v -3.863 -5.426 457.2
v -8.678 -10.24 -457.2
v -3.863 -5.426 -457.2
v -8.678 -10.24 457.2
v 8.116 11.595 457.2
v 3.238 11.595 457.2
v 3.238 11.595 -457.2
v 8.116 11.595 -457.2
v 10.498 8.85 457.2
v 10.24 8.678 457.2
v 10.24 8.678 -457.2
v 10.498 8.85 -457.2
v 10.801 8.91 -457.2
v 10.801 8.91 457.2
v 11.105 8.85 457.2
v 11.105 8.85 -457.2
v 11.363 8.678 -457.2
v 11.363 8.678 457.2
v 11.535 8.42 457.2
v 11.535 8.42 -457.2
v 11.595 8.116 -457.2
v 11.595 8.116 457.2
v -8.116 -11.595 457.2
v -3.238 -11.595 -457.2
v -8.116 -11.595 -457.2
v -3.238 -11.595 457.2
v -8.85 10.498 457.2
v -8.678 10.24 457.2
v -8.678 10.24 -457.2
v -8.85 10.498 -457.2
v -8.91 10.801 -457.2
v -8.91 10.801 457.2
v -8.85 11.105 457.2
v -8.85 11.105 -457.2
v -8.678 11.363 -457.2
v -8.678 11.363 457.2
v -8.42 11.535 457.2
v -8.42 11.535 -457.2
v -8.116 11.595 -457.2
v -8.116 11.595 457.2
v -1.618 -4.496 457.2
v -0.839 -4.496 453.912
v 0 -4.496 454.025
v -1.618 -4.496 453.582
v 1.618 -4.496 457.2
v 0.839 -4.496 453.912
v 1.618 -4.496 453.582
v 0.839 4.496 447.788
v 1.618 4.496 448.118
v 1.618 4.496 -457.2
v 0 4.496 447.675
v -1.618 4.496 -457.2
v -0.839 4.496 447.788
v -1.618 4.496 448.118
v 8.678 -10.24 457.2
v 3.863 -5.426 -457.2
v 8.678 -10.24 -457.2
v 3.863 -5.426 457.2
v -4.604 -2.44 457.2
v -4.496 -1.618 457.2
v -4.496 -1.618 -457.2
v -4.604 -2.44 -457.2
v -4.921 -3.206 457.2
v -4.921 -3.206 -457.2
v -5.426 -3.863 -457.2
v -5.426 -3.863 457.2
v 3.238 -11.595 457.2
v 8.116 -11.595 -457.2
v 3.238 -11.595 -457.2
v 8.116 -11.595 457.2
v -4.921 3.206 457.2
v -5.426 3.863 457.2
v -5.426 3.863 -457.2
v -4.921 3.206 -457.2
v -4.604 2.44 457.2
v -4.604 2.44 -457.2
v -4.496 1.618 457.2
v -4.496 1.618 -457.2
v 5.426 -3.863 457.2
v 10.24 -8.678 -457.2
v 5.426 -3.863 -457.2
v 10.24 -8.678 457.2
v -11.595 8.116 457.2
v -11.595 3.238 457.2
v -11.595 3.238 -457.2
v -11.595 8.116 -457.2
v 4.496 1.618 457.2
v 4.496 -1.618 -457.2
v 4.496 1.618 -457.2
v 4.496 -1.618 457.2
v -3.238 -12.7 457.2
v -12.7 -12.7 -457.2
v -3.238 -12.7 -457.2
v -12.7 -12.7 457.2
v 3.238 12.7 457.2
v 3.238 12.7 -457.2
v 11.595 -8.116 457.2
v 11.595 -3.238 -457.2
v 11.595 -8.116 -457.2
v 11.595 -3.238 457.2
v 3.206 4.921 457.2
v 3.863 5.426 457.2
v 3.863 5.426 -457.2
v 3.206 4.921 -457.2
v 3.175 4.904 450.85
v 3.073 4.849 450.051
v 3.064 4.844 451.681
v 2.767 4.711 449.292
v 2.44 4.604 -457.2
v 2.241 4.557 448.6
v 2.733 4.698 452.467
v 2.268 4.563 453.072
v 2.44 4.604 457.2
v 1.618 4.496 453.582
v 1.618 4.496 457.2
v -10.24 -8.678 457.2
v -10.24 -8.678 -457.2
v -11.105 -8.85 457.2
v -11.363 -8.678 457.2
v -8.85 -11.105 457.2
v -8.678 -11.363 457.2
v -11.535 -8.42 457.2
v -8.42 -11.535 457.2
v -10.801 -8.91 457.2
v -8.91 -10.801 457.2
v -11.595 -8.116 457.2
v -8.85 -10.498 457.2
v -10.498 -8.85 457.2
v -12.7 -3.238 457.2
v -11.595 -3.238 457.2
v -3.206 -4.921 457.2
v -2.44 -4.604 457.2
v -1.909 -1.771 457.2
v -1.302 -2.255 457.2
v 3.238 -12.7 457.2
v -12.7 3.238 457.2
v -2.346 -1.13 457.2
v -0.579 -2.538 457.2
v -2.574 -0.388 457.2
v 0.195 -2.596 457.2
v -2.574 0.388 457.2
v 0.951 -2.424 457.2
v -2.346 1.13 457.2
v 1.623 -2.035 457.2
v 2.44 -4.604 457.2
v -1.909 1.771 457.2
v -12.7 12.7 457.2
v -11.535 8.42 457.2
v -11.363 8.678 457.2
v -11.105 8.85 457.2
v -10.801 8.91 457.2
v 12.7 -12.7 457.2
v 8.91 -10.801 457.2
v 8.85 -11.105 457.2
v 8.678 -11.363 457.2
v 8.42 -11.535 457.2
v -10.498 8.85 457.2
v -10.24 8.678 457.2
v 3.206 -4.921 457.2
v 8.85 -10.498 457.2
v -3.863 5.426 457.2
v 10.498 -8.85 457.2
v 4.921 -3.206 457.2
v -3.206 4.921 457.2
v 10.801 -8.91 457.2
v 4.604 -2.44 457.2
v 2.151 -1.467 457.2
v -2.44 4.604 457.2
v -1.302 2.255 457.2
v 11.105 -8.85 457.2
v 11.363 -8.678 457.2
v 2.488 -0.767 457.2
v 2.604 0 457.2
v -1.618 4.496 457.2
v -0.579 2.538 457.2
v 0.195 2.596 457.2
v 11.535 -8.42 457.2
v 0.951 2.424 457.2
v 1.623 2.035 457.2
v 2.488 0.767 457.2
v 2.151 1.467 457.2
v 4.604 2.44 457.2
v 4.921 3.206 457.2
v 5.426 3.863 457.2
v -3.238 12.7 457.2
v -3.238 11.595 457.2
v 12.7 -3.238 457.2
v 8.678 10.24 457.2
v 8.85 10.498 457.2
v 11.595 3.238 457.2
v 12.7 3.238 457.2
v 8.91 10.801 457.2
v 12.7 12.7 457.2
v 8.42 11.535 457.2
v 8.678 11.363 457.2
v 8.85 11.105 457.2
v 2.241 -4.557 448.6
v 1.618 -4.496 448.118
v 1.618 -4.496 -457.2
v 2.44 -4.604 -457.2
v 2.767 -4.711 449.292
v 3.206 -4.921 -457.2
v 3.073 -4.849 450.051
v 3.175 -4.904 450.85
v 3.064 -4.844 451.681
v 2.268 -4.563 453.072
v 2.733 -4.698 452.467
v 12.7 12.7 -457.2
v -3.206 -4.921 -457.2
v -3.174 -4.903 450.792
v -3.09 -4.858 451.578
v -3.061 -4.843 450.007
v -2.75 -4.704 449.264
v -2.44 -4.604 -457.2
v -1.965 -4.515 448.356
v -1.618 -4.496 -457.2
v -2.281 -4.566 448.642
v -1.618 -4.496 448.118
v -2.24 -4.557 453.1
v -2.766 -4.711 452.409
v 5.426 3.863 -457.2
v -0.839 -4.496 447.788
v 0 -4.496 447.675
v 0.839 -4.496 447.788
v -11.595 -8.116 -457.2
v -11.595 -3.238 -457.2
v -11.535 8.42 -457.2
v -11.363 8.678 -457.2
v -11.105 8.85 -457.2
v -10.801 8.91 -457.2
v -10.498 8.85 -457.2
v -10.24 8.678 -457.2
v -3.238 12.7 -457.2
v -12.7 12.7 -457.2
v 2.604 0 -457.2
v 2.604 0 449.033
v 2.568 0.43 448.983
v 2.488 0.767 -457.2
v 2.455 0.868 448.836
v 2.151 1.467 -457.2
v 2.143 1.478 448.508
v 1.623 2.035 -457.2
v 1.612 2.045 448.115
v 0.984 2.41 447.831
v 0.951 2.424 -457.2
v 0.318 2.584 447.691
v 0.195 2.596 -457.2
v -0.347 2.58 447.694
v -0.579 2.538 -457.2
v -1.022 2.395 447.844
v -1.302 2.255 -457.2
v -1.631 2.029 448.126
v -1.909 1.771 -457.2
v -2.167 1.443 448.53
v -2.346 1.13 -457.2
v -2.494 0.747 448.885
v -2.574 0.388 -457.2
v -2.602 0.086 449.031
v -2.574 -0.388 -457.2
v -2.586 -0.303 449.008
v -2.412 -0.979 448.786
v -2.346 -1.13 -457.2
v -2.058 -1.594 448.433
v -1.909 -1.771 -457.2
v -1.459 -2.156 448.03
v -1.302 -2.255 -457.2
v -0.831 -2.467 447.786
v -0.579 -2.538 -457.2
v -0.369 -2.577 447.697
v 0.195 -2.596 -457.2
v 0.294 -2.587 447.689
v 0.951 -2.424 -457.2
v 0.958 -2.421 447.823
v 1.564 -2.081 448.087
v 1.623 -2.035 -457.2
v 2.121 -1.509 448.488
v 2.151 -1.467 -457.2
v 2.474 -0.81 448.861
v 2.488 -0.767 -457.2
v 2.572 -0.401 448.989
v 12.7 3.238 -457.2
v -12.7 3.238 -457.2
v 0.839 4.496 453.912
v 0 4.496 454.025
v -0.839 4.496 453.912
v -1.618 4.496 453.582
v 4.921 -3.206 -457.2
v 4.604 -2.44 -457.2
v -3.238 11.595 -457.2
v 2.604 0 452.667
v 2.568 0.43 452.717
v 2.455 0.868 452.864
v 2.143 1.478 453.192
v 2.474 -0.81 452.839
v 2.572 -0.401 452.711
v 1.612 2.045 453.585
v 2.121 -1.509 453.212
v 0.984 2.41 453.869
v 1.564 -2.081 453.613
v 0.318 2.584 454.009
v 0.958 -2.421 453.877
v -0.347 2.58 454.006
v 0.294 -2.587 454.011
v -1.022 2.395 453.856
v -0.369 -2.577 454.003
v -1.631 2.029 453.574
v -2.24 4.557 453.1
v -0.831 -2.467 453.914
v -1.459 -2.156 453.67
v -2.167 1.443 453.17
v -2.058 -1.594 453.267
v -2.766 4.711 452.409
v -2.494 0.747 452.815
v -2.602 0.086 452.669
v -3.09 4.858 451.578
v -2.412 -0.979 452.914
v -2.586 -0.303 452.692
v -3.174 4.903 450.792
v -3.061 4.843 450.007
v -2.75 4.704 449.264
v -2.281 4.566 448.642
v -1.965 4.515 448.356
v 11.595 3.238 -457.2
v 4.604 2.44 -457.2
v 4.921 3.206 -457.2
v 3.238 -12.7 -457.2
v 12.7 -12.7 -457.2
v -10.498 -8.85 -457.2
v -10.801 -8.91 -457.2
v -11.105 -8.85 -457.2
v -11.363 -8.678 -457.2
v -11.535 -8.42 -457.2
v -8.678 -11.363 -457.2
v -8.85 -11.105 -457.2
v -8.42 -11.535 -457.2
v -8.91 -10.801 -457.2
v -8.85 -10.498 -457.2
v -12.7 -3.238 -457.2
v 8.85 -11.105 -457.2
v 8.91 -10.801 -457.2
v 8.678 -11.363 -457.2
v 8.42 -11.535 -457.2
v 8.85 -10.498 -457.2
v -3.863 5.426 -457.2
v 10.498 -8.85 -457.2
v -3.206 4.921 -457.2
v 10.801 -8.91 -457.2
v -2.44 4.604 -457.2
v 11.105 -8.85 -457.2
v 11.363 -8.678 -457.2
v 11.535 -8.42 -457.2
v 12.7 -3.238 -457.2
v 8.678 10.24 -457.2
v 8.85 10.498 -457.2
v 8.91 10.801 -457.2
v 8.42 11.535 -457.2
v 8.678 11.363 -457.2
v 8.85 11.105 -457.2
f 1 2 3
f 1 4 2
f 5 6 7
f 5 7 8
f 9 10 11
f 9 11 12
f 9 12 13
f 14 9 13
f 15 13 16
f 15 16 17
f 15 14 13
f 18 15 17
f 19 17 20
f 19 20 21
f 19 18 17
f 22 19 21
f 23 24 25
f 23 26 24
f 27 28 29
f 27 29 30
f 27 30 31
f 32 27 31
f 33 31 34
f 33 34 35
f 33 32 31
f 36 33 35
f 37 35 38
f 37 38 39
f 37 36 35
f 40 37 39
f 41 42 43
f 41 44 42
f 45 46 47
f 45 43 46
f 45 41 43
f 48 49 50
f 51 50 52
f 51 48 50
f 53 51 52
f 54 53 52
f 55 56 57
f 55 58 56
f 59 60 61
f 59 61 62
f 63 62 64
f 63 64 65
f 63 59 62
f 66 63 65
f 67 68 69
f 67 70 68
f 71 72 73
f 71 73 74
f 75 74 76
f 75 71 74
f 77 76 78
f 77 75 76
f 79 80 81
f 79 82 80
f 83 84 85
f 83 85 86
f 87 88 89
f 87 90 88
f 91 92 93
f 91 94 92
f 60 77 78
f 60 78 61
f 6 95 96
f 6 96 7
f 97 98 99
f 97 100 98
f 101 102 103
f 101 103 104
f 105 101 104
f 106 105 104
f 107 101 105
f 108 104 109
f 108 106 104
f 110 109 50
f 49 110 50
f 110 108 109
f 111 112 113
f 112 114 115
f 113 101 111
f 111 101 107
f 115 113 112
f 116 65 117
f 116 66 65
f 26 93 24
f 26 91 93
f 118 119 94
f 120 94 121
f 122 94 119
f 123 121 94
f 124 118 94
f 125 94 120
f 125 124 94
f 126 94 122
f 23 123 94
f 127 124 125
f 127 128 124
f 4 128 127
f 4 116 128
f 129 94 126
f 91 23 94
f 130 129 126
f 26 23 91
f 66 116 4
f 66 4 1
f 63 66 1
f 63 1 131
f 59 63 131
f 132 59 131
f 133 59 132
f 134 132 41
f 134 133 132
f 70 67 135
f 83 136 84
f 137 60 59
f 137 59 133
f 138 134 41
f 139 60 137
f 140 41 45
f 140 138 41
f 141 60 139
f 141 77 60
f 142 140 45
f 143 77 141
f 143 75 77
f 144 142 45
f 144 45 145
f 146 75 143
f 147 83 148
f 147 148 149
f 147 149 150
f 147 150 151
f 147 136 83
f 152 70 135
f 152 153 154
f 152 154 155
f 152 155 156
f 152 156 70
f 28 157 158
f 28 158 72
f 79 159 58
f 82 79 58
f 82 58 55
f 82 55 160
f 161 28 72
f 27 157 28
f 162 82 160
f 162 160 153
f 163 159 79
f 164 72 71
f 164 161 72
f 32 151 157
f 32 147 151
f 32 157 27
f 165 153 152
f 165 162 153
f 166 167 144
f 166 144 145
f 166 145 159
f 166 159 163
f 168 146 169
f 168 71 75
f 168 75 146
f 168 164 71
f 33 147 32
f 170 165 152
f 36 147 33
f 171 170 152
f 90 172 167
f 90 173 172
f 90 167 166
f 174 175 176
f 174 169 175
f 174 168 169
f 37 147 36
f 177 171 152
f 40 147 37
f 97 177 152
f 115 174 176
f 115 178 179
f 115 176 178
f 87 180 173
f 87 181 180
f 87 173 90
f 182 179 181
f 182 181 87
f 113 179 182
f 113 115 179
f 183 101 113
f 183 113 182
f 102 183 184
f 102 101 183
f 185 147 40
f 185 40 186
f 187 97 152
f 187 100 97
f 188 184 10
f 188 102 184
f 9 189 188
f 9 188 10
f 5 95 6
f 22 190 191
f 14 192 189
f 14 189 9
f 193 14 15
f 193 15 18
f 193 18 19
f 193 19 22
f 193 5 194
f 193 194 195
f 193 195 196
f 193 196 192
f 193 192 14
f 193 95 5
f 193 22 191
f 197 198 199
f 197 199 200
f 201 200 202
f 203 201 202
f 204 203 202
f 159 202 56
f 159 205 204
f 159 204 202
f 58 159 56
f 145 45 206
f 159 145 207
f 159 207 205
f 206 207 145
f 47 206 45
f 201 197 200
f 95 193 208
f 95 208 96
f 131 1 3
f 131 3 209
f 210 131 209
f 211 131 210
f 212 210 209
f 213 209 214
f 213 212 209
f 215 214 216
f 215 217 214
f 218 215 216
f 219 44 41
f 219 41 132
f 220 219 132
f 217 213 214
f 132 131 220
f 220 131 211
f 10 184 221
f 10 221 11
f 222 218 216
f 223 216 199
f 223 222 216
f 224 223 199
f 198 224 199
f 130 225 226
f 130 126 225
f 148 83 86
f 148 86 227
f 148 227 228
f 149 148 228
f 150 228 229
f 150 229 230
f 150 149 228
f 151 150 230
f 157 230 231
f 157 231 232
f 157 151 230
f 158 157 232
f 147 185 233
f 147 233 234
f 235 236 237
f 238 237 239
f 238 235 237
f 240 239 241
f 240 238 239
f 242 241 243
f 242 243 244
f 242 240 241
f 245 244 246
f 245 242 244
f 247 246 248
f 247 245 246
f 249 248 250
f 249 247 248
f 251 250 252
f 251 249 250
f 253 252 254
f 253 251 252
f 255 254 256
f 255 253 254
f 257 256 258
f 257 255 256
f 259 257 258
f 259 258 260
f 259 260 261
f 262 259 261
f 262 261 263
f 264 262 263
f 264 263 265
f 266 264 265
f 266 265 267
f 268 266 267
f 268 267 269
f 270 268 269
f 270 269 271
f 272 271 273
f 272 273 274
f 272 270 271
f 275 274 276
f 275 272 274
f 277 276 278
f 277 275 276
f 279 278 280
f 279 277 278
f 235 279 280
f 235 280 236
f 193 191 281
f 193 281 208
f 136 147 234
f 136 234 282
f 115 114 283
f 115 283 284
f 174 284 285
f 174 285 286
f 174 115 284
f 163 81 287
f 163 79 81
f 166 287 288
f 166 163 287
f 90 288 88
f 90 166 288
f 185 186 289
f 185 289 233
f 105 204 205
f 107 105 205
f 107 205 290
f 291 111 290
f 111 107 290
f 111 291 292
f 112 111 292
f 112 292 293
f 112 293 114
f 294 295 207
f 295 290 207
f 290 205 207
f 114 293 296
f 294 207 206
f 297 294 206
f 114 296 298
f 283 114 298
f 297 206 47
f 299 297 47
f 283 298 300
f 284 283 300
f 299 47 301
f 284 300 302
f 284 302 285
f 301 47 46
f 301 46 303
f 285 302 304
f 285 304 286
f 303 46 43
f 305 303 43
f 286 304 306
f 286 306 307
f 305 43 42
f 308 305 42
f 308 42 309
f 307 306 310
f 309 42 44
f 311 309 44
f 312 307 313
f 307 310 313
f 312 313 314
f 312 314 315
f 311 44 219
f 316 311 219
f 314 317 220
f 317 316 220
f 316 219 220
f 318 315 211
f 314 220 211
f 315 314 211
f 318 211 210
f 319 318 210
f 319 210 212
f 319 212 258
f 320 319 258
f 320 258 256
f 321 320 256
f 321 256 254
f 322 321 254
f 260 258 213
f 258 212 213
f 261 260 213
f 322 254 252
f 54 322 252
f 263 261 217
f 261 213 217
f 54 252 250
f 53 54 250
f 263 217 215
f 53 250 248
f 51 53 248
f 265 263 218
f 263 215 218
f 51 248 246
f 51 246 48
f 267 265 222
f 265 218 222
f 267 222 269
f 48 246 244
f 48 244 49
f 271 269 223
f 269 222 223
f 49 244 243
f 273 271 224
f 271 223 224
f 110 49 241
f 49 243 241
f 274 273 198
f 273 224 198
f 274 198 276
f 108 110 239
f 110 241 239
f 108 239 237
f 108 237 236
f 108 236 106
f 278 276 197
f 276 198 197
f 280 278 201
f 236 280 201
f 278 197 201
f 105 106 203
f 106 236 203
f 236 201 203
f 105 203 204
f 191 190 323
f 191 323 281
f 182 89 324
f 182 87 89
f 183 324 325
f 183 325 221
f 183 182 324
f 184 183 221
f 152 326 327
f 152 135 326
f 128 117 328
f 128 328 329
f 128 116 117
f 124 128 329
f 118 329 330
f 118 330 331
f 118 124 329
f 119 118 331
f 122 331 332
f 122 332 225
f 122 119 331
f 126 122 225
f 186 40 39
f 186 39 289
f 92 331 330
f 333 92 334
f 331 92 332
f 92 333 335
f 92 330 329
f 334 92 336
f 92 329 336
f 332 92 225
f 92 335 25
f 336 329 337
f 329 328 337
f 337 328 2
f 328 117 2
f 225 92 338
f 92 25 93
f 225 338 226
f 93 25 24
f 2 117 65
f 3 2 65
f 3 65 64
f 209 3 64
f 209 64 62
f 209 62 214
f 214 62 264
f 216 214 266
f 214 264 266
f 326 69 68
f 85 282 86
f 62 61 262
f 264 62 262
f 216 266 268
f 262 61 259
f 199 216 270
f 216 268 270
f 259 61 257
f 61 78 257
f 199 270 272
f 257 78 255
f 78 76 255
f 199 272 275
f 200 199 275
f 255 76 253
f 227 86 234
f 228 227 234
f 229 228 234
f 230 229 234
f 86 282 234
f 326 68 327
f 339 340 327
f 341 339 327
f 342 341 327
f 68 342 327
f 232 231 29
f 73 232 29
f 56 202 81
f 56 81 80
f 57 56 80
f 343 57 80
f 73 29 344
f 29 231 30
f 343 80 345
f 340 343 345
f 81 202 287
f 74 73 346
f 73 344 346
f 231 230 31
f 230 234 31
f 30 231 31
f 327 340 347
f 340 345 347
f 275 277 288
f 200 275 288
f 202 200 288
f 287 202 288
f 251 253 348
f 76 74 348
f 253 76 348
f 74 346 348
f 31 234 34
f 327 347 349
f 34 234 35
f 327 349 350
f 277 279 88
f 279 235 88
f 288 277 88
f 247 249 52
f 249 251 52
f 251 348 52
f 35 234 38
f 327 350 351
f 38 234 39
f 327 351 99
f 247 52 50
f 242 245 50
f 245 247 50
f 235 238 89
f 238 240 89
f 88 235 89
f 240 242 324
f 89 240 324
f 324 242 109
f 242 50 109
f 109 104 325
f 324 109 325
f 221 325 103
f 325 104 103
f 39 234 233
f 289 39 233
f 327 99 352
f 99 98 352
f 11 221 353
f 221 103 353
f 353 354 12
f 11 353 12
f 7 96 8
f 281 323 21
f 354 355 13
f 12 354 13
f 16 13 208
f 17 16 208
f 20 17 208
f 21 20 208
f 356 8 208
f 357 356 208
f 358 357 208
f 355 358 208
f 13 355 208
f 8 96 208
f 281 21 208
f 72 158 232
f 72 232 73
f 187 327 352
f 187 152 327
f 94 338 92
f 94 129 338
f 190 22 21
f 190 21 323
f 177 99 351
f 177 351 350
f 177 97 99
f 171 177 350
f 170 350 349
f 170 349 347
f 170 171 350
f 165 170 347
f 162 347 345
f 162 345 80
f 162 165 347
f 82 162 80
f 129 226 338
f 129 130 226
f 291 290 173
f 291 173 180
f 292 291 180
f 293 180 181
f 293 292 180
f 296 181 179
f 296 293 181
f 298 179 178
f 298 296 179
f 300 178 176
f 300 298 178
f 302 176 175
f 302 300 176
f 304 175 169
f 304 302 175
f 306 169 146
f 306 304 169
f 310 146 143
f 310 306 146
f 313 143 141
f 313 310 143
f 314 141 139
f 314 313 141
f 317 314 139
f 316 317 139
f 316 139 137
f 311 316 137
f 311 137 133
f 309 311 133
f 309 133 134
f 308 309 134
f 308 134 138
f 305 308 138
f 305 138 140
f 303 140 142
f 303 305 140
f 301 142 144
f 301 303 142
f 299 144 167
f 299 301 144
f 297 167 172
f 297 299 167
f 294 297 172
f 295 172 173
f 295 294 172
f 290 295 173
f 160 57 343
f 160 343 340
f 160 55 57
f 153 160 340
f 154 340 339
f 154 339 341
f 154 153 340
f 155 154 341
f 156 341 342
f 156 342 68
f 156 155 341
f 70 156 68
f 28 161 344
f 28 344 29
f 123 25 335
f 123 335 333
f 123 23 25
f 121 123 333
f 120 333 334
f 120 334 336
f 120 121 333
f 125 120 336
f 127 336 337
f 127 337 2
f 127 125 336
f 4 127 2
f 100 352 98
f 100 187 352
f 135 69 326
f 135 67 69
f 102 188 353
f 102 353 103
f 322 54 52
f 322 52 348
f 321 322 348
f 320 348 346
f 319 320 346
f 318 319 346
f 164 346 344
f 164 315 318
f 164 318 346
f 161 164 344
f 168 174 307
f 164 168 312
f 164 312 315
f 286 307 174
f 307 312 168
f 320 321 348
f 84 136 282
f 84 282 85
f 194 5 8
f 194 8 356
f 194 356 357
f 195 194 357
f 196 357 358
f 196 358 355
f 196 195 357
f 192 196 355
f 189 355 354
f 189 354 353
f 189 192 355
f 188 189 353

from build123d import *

# Parameters (mm, degrees)
F0_R     = 2.6035
F1_DEPTH = 457.2
F2_R     = 3.175
F3_DEPTH = 25.4


with BuildPart() as f1:
    # F0 (on Top) → F1 (new body, symmetric)
    with BuildSketch(Plane.XY):
        with BuildLine():
            ThreePointArc((4.4958, 1.618107), (4.737482, 2.833127), (5.425736, 3.863171))
            Line((5.425736, 3.863171), (10.240084, 8.677519))
            ThreePointArc((10.240084, 8.677519), (11.105105, 8.849583), (11.5951, 8.116253))
            Line((11.5951, 8.116253), (11.5951, 3.2385))
            Line((11.5951, 3.2385), (12.7, 3.2385))
            Line((12.7, 3.2385), (12.7, 12.7))
            Line((12.7, 12.7), (3.2385, 12.7))
            Line((3.2385, 12.7), (3.2385, 11.5951))
            Line((3.2385, 11.5951), (8.116253, 11.5951))
            ThreePointArc((8.116253, 11.5951), (8.849583, 11.105105), (8.677519, 10.240084))
            Line((8.677519, 10.240084), (3.863171, 5.425736))
            ThreePointArc((3.863171, 5.425736), (2.833127, 4.737482), (1.618107, 4.4958))
            Line((1.618107, 4.4958), (0, 4.4958))
            Line((0, 4.4958), (-1.618107, 4.4958))
            ThreePointArc((-1.618107, 4.4958), (-2.833127, 4.737482), (-3.863171, 5.425736))
            Line((-3.863171, 5.425736), (-8.677519, 10.240084))
            ThreePointArc((-8.677519, 10.240084), (-8.849583, 11.105105), (-8.116253, 11.5951))
            Line((-8.116253, 11.5951), (-3.2385, 11.5951))
            Line((-3.2385, 11.5951), (-3.2385, 12.7))
            Line((-3.2385, 12.7), (-12.7, 12.7))
            Line((-12.7, 12.7), (-12.7, 3.2385))
            Line((-12.7, 3.2385), (-11.5951, 3.2385))
            Line((-11.5951, 3.2385), (-11.5951, 8.116253))
            ThreePointArc((-11.5951, 8.116253), (-11.105105, 8.849583), (-10.240084, 8.677519))
            Line((-10.240084, 8.677519), (-5.425736, 3.863171))
            ThreePointArc((-5.425736, 3.863171), (-4.737482, 2.833127), (-4.4958, 1.618107))
            Line((-4.4958, 1.618107), (-4.4958, 0))
            Line((-4.4958, 0), (-4.4958, -1.618107))
            ThreePointArc((-4.4958, -1.618107), (-4.737482, -2.833127), (-5.425736, -3.863171))
            Line((-5.425736, -3.863171), (-10.240084, -8.677519))
            ThreePointArc((-10.240084, -8.677519), (-11.105105, -8.849583), (-11.5951, -8.116253))
            Line((-11.5951, -8.116253), (-11.5951, -3.2385))
            Line((-11.5951, -3.2385), (-12.7, -3.2385))
            Line((-12.7, -3.2385), (-12.7, -12.7))
            Line((-12.7, -12.7), (-3.2385, -12.7))
            Line((-3.2385, -12.7), (-3.2385, -11.5951))
            Line((-3.2385, -11.5951), (-8.116253, -11.5951))
            ThreePointArc((-8.116253, -11.5951), (-8.849583, -11.105105), (-8.677519, -10.240084))
            Line((-8.677519, -10.240084), (-3.863171, -5.425736))
            ThreePointArc((-3.863171, -5.425736), (-2.833127, -4.737482), (-1.618107, -4.4958))
            Line((-1.618107, -4.4958), (0, -4.4958))
            Line((0, -4.4958), (1.618107, -4.4958))
            ThreePointArc((1.618107, -4.4958), (2.833127, -4.737482), (3.863171, -5.425736))
            Line((3.863171, -5.425736), (8.677519, -10.240084))
            ThreePointArc((8.677519, -10.240084), (8.849583, -11.105105), (8.116253, -11.5951))
            Line((8.116253, -11.5951), (3.2385, -11.5951))
            Line((3.2385, -11.5951), (3.2385, -12.7))
            Line((3.2385, -12.7), (12.7, -12.7))
            Line((12.7, -12.7), (12.7, -3.2385))
            Line((12.7, -3.2385), (11.5951, -3.2385))
            Line((11.5951, -3.2385), (11.5951, -8.116253))
            ThreePointArc((11.5951, -8.116253), (11.105105, -8.849583), (10.240084, -8.677519))
            Line((10.240084, -8.677519), (5.425736, -3.863171))
            ThreePointArc((5.425736, -3.863171), (4.737482, -2.833127), (4.4958, -1.618107))
            Line((4.4958, -1.618107), (4.4958, 0))
            Line((4.4958, 0), (4.4958, 1.618107))
        make_face()
        Circle(F0_R, mode=Mode.SUBTRACT)
    extrude(amount=F1_DEPTH, both=True)

    # F2 (on Front) → F3 (cut, symmetric)
    with BuildSketch(Plane.XZ):
        with Locations((0, 450.85)):
            Circle(F2_R)
    extrude(amount=F3_DEPTH, both=True, mode=Mode.SUBTRACT)


solid = f1.part
